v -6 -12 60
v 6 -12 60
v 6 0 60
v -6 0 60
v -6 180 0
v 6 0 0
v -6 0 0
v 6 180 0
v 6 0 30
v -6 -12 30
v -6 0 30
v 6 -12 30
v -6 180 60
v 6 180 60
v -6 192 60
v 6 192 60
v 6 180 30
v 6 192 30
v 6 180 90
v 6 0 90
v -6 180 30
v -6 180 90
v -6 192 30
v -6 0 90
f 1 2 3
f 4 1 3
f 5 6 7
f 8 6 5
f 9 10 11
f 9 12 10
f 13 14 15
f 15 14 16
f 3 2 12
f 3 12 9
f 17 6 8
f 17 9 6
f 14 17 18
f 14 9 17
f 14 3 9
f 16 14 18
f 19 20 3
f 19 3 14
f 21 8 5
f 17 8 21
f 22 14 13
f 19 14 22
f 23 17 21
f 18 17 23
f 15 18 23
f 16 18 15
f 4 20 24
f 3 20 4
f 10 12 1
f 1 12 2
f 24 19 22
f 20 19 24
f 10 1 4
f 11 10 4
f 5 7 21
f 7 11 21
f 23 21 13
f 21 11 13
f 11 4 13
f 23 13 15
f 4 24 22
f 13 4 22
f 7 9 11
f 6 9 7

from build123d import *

# Parameters (mm, degrees)
F0_W     = 12
F0_H     = 30
F1_DEPTH = 6
F2_DEPTH = 6


with BuildPart() as f1:
    # F0 (on Right) → F1 (new body, symmetric)
    with BuildSketch(Plane.YZ):
        Polygon((0, 30), (0, 0), (90, 0), (180, 0), (180, 30), (180, 60), (180, 90), (90, 90), (0, 90), (0, 60), align=None)
        with Locations((-6, 45)):
            Rectangle(F0_W, F0_H)
        with Locations((186, 45)):
            Rectangle(F0_W, F0_H)
    extrude(amount=F1_DEPTH, both=True)

    # F0 (on Right) → F2 (join, symmetric)
    with BuildSketch(Plane.YZ):
        Polygon((0, 30), (0, 0), (90, 0), (180, 0), (180, 30), (180, 60), (180, 90), (90, 90), (0, 90), (0, 60), align=None)
        with Locations((-6, 45)):
            Rectangle(F0_W, F0_H)
        with Locations((186, 45)):
            Rectangle(F0_W, F0_H)
    extrude(amount=F2_DEPTH, both=True)


solid = f1.part
